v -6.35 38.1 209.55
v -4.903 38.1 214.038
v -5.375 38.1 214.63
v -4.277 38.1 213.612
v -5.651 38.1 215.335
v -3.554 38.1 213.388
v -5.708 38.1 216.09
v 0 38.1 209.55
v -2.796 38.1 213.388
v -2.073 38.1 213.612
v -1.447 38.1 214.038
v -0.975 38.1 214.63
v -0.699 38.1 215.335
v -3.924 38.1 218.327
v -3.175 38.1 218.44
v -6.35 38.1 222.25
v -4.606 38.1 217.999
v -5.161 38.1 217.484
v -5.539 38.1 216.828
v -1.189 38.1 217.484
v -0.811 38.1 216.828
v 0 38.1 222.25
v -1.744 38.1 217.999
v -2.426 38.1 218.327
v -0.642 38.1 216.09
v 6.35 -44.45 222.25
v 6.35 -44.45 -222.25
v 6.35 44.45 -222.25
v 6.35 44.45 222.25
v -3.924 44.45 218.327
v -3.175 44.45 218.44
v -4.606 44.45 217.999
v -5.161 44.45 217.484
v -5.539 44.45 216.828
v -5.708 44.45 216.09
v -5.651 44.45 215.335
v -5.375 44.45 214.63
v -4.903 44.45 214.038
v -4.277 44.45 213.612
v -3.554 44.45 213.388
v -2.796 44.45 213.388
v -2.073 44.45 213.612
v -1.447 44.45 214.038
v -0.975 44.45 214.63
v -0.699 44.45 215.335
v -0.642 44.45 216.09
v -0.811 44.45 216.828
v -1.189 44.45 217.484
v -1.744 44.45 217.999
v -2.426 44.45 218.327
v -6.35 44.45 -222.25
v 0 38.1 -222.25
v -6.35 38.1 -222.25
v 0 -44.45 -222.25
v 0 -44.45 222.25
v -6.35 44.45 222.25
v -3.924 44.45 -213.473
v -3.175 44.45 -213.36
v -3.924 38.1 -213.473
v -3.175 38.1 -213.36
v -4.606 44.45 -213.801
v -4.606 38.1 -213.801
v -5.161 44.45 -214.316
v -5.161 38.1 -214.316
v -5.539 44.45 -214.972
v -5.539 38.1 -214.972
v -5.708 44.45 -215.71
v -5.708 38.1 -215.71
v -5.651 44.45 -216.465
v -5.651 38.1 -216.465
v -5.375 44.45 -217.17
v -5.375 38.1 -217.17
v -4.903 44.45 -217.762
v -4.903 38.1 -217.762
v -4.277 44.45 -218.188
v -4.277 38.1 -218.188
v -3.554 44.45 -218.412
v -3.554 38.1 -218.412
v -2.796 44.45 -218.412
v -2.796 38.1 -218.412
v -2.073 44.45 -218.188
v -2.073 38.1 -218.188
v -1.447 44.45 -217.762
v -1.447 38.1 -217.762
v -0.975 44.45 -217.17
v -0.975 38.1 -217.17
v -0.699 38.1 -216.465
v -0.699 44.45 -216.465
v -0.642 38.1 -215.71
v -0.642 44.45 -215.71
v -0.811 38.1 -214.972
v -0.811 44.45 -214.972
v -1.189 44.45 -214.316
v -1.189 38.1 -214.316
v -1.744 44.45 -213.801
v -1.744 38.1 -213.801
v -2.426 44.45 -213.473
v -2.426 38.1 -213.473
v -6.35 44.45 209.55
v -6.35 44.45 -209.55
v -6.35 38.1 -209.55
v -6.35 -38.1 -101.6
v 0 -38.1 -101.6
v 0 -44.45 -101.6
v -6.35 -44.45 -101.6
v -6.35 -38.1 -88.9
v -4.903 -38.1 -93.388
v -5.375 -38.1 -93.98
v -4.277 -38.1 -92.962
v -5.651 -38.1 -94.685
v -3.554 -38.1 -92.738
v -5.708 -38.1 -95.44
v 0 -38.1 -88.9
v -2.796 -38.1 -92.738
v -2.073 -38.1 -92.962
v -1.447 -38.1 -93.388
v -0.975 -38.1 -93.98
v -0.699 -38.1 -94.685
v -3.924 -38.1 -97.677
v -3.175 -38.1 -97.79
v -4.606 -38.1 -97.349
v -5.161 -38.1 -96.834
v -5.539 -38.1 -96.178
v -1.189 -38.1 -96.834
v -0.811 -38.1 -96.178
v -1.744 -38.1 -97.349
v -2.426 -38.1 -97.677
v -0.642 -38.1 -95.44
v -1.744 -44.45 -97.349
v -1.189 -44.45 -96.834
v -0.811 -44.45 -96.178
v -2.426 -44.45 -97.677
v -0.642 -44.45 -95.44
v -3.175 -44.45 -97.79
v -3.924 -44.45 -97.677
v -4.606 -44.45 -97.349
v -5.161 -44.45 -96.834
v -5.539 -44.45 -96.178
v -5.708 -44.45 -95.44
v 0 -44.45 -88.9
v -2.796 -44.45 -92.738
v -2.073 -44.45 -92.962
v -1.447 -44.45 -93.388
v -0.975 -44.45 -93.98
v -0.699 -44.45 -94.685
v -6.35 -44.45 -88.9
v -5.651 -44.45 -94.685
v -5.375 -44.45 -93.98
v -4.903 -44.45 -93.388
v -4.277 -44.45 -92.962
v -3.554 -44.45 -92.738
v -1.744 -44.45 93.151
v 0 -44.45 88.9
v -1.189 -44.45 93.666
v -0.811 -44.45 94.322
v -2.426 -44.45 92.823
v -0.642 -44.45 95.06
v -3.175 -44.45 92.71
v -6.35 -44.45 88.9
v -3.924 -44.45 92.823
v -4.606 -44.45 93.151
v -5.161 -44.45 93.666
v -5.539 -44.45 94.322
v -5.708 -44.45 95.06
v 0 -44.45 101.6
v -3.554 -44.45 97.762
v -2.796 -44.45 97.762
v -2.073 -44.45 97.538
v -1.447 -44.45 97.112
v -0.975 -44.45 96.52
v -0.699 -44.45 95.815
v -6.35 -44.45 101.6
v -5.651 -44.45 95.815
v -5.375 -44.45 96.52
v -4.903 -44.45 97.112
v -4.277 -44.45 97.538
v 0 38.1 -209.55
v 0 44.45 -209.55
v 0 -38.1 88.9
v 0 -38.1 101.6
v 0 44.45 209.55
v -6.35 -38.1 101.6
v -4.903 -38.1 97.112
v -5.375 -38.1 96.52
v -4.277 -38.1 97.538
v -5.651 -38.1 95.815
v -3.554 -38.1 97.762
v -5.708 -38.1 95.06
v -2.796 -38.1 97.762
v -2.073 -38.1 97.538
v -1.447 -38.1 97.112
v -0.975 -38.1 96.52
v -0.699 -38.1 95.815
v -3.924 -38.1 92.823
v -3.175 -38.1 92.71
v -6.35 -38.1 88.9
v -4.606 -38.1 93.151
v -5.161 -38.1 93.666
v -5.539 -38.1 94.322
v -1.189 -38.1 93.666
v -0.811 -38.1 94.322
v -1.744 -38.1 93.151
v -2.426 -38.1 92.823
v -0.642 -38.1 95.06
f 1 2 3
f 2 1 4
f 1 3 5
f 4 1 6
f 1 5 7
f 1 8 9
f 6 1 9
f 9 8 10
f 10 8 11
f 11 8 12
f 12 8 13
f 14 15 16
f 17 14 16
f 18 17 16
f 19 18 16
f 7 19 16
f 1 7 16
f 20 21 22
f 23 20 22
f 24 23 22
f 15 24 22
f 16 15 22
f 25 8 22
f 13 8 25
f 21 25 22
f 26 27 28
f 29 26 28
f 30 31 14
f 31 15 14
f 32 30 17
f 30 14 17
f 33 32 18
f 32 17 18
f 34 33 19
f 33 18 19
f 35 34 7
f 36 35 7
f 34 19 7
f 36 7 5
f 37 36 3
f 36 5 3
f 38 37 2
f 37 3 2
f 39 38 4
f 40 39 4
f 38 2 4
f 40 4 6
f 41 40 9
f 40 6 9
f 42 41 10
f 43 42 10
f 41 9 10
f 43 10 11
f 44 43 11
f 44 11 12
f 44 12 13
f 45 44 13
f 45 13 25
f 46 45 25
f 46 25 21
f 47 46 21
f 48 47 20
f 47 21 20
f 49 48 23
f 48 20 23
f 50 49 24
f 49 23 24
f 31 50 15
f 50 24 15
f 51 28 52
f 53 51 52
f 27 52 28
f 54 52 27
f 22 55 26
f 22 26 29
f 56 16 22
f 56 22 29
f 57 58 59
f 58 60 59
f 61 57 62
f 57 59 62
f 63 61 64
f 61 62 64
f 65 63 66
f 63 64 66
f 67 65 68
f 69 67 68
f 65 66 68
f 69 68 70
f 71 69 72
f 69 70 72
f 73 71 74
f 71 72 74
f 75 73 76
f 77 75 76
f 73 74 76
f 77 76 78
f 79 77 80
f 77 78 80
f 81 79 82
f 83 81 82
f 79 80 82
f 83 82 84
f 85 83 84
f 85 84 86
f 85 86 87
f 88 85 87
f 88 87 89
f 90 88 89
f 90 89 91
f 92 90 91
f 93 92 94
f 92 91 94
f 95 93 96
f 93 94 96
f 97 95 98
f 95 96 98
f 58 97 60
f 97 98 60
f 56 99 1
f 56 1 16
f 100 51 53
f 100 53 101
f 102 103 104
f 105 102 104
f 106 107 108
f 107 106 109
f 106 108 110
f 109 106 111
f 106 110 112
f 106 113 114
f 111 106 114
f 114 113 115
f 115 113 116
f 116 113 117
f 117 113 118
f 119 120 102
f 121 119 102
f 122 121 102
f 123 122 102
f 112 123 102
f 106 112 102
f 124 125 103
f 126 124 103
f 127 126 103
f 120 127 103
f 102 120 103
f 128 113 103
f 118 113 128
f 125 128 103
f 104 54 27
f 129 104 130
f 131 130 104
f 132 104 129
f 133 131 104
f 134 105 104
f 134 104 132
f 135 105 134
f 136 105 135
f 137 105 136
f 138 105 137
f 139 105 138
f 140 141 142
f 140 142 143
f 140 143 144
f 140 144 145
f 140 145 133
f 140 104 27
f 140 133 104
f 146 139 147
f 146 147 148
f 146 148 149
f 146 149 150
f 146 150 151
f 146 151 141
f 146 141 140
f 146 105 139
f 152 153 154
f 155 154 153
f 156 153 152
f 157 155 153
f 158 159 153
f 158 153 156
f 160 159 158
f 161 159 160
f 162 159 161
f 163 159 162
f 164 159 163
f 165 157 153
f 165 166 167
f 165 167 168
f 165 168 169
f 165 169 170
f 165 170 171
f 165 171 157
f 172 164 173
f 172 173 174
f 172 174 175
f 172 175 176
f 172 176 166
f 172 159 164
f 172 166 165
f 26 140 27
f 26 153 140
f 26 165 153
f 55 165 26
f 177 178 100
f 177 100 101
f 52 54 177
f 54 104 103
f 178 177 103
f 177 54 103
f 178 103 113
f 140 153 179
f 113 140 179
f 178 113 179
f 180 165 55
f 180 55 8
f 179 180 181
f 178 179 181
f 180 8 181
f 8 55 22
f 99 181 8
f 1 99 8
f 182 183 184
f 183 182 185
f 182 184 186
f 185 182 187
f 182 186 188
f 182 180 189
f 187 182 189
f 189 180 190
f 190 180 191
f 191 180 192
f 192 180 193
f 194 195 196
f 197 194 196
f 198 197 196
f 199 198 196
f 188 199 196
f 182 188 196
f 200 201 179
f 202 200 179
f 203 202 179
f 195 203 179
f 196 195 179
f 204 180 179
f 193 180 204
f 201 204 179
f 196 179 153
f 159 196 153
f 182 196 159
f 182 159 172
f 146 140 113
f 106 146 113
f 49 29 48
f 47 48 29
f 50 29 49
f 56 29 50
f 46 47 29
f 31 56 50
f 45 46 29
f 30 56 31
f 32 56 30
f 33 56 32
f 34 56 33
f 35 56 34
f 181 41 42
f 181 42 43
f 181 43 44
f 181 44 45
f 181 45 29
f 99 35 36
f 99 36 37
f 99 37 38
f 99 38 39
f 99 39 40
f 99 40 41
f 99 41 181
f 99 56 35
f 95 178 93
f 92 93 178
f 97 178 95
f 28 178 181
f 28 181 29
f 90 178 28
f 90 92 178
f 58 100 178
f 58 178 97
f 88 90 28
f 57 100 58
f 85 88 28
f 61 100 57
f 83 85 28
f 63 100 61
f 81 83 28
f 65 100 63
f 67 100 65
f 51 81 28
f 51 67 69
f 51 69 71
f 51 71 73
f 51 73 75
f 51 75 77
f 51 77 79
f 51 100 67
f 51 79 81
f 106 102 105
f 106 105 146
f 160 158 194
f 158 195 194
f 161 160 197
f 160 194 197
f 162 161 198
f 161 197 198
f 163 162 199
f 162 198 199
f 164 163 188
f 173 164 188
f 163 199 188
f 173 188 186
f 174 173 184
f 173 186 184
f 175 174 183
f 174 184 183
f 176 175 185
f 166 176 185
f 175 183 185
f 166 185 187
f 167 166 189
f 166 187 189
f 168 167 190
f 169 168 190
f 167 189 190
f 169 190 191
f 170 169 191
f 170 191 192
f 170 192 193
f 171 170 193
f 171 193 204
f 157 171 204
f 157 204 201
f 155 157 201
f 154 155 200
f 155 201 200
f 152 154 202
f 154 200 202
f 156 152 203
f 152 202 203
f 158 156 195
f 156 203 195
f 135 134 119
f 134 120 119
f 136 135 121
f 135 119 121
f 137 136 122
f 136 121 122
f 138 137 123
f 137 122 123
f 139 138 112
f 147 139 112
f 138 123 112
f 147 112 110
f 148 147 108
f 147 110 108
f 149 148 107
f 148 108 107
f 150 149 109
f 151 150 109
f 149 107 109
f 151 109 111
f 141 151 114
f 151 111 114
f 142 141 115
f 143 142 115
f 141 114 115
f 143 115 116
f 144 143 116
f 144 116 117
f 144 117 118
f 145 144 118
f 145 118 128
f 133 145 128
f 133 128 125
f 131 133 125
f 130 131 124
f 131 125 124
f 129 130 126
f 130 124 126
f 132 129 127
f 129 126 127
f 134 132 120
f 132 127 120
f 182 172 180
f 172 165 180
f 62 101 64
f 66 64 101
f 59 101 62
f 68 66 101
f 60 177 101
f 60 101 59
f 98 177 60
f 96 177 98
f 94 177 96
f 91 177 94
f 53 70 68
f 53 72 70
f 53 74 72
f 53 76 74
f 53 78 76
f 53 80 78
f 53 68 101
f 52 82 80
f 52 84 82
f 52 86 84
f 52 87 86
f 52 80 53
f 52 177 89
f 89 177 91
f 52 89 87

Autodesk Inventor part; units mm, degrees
ref_plane "YZ Plane" through (0, 0, 0) normal (1, 0, 0) x (0, 1, 0)
ref_plane "XZ Plane" through (0, 0, 0) normal (0, 1, 0) x (-1, 0, 0)
ref_plane "XY Plane" through (0, 0, 0) normal (0, 0, 1) x (1, 0, 0)
sketch "Sketch1" plane through (0, 0, 0) normal (1, 0, 0) x (0, 1, 0)
  line L0 (-44.45, 222.25) -> (44.45, 222.25)
  line L1 (44.45, 222.25) -> (44.45, -222.25)
  line L2 (44.45, -222.25) -> (-44.45, -222.25)
  line L3 (-44.45, -222.25) -> (-44.45, 222.25)
  line L4 (-44.45, 222.25) -> (44.45, -222.25) construction
  line L5 (44.45, 222.25) -> (-44.45, -222.25) construction
  point P0 (0, 0)
  dimension "d0" = 88.9
  dimension "d1" = 444.5
extrude "Extrusion1" add sketch "Sketch1" along normal blind 6.35
sketch "Sketch2" plane through (0, 0, 0) normal (-1, 0, 0) x (0, 0, 1)
  line L0 (-222.25, -44.45) -> (-222.25, 44.45) projected
  line L1 (-222.25, 44.45) -> (-209.55, 44.45)
  line L2 (-209.55, 44.45) -> (-209.55, 38.1)
  line L3 (-209.55, 38.1) -> (-222.25, 38.1)
  line L4 (-222.25, 38.1) -> (-222.25, 44.45)
  line L5 (-222.25, 44.45) -> (222.25, 44.45) projected
  line L6 (222.25, 44.45) -> (209.55, 44.45)
  line L7 (209.55, 44.45) -> (209.55, 38.1)
  line L8 (209.55, 38.1) -> (222.25, 38.1)
  line L9 (222.25, 38.1) -> (222.25, 44.45)
  line L10 (222.25, -44.45) -> (-222.25, -44.45) projected
  line L11 (-101.6, -44.45) -> (-88.9, -44.45)
  line L12 (-88.9, -44.45) -> (-88.9, -38.1)
  line L13 (-88.9, -38.1) -> (-101.6, -38.1)
  line L14 (-101.6, -38.1) -> (-101.6, -44.45)
  line L15 (88.9, -44.45) -> (101.6, -44.45)
  line L16 (101.6, -44.45) -> (101.6, -38.1)
  line L17 (101.6, -38.1) -> (88.9, -38.1)
  line L18 (88.9, -38.1) -> (88.9, -44.45)
  point P0 (0, 0)
  dimension "d4" = 12.7
  dimension "d5" = 6.35
  dimension "d6" = 6.35
  dimension "d7" = 12.7
  dimension "d8" = 6.35
  dimension "d9" = 12.7
  dimension "d10" = 12.7
  dimension "d11" = 88.9
  dimension "d12" = 88.9
extrude "Extrusion2" add sketch "Sketch2" along normal blind 6.35
sketch "Sketch3" plane through (6.35, 44.45, 222.25) normal (0, 1, 0) x (1, 0, 0)
  line L0 (-6.35, 120.65) -> (-6.35, 0) projected
  line L1 (0, 0) -> (-12.7, 0) projected
  line L2 (-12.7, 431.8) -> (-12.7, 444.5) projected
  line L3 (0, 444.5) -> (-12.7, 444.5) projected
  line L4 (-6.35, 431.8) -> (-12.7, 431.8) projected
  line L5 (-6.35, 12.7) -> (-12.7, 12.7) projected
  line L6 (-12.7, 0) -> (-12.7, 12.7) projected
  point P0 (-6.35, 222.25)
  point P1 (-9.525, 6.35)
  point P2 (-9.525, 438.15)
  dimension "d44" = 3.175
  dimension "d45" = 6.35
  dimension "d46" = 6.35
  dimension "d47" = 3.175
sketch "Sketch4" plane through (6.35, -44.45, -222.25) normal (0, -1, 0) x (1, 0, 0)
  line L0 (-6.35, 311.15) -> (-6.35, 323.85)
  line L1 (-6.35, 431.8) -> (-6.35, 12.7)
  line L2 (-6.35, 120.65) -> (-12.7, 120.65) projected
  line L3 (-12.7, 120.65) -> (-12.7, 133.35) projected
  line L4 (-12.7, 311.15) -> (-12.7, 323.85) projected
  line L5 (-6.35, 323.85) -> (-12.7, 323.85) projected
  point P0 (-6.35, 222.25)
  point P1 (-9.525, 317.5)
  point P2 (-9.525, 127)
  dimension "d33" = 3.175
  dimension "d34" = 6.35
  dimension "d35" = 3.175
  dimension "d36" = 6.35
hole "Hole3" at (-3.175, -44.45, 95.25) at (-3.175, -44.45, -95.25) direction (0, 1, 0) diameter 5.08 depth 6.35 tip angle 118
hole "Hole4" at (-3.175, 44.45, 215.9) at (-3.175, 44.45, -215.9) direction (0, -1, 0) diameter 5.08 depth 6.35 tip angle 118
equation "\"d6\" = d5"
equation "\"d7\" = d4"
equation "\"d8\" = d5"
equation "\"d9\" = d4"
equation "\"d10\" = d9"
equation "\"d46\" = d45"
equation "\"d47\" = d44"
equation "\"d35\" = d33"
equation "\"d36\" = d34"
equation "\"d42\" = d15"
equation "\"d53\" = d15"
equation "\"d15\" = d17"
equation "\"d17\" = d16"
equation "\"d16\" = 6.35"
properties part number "FrameTestinsidePlate"
